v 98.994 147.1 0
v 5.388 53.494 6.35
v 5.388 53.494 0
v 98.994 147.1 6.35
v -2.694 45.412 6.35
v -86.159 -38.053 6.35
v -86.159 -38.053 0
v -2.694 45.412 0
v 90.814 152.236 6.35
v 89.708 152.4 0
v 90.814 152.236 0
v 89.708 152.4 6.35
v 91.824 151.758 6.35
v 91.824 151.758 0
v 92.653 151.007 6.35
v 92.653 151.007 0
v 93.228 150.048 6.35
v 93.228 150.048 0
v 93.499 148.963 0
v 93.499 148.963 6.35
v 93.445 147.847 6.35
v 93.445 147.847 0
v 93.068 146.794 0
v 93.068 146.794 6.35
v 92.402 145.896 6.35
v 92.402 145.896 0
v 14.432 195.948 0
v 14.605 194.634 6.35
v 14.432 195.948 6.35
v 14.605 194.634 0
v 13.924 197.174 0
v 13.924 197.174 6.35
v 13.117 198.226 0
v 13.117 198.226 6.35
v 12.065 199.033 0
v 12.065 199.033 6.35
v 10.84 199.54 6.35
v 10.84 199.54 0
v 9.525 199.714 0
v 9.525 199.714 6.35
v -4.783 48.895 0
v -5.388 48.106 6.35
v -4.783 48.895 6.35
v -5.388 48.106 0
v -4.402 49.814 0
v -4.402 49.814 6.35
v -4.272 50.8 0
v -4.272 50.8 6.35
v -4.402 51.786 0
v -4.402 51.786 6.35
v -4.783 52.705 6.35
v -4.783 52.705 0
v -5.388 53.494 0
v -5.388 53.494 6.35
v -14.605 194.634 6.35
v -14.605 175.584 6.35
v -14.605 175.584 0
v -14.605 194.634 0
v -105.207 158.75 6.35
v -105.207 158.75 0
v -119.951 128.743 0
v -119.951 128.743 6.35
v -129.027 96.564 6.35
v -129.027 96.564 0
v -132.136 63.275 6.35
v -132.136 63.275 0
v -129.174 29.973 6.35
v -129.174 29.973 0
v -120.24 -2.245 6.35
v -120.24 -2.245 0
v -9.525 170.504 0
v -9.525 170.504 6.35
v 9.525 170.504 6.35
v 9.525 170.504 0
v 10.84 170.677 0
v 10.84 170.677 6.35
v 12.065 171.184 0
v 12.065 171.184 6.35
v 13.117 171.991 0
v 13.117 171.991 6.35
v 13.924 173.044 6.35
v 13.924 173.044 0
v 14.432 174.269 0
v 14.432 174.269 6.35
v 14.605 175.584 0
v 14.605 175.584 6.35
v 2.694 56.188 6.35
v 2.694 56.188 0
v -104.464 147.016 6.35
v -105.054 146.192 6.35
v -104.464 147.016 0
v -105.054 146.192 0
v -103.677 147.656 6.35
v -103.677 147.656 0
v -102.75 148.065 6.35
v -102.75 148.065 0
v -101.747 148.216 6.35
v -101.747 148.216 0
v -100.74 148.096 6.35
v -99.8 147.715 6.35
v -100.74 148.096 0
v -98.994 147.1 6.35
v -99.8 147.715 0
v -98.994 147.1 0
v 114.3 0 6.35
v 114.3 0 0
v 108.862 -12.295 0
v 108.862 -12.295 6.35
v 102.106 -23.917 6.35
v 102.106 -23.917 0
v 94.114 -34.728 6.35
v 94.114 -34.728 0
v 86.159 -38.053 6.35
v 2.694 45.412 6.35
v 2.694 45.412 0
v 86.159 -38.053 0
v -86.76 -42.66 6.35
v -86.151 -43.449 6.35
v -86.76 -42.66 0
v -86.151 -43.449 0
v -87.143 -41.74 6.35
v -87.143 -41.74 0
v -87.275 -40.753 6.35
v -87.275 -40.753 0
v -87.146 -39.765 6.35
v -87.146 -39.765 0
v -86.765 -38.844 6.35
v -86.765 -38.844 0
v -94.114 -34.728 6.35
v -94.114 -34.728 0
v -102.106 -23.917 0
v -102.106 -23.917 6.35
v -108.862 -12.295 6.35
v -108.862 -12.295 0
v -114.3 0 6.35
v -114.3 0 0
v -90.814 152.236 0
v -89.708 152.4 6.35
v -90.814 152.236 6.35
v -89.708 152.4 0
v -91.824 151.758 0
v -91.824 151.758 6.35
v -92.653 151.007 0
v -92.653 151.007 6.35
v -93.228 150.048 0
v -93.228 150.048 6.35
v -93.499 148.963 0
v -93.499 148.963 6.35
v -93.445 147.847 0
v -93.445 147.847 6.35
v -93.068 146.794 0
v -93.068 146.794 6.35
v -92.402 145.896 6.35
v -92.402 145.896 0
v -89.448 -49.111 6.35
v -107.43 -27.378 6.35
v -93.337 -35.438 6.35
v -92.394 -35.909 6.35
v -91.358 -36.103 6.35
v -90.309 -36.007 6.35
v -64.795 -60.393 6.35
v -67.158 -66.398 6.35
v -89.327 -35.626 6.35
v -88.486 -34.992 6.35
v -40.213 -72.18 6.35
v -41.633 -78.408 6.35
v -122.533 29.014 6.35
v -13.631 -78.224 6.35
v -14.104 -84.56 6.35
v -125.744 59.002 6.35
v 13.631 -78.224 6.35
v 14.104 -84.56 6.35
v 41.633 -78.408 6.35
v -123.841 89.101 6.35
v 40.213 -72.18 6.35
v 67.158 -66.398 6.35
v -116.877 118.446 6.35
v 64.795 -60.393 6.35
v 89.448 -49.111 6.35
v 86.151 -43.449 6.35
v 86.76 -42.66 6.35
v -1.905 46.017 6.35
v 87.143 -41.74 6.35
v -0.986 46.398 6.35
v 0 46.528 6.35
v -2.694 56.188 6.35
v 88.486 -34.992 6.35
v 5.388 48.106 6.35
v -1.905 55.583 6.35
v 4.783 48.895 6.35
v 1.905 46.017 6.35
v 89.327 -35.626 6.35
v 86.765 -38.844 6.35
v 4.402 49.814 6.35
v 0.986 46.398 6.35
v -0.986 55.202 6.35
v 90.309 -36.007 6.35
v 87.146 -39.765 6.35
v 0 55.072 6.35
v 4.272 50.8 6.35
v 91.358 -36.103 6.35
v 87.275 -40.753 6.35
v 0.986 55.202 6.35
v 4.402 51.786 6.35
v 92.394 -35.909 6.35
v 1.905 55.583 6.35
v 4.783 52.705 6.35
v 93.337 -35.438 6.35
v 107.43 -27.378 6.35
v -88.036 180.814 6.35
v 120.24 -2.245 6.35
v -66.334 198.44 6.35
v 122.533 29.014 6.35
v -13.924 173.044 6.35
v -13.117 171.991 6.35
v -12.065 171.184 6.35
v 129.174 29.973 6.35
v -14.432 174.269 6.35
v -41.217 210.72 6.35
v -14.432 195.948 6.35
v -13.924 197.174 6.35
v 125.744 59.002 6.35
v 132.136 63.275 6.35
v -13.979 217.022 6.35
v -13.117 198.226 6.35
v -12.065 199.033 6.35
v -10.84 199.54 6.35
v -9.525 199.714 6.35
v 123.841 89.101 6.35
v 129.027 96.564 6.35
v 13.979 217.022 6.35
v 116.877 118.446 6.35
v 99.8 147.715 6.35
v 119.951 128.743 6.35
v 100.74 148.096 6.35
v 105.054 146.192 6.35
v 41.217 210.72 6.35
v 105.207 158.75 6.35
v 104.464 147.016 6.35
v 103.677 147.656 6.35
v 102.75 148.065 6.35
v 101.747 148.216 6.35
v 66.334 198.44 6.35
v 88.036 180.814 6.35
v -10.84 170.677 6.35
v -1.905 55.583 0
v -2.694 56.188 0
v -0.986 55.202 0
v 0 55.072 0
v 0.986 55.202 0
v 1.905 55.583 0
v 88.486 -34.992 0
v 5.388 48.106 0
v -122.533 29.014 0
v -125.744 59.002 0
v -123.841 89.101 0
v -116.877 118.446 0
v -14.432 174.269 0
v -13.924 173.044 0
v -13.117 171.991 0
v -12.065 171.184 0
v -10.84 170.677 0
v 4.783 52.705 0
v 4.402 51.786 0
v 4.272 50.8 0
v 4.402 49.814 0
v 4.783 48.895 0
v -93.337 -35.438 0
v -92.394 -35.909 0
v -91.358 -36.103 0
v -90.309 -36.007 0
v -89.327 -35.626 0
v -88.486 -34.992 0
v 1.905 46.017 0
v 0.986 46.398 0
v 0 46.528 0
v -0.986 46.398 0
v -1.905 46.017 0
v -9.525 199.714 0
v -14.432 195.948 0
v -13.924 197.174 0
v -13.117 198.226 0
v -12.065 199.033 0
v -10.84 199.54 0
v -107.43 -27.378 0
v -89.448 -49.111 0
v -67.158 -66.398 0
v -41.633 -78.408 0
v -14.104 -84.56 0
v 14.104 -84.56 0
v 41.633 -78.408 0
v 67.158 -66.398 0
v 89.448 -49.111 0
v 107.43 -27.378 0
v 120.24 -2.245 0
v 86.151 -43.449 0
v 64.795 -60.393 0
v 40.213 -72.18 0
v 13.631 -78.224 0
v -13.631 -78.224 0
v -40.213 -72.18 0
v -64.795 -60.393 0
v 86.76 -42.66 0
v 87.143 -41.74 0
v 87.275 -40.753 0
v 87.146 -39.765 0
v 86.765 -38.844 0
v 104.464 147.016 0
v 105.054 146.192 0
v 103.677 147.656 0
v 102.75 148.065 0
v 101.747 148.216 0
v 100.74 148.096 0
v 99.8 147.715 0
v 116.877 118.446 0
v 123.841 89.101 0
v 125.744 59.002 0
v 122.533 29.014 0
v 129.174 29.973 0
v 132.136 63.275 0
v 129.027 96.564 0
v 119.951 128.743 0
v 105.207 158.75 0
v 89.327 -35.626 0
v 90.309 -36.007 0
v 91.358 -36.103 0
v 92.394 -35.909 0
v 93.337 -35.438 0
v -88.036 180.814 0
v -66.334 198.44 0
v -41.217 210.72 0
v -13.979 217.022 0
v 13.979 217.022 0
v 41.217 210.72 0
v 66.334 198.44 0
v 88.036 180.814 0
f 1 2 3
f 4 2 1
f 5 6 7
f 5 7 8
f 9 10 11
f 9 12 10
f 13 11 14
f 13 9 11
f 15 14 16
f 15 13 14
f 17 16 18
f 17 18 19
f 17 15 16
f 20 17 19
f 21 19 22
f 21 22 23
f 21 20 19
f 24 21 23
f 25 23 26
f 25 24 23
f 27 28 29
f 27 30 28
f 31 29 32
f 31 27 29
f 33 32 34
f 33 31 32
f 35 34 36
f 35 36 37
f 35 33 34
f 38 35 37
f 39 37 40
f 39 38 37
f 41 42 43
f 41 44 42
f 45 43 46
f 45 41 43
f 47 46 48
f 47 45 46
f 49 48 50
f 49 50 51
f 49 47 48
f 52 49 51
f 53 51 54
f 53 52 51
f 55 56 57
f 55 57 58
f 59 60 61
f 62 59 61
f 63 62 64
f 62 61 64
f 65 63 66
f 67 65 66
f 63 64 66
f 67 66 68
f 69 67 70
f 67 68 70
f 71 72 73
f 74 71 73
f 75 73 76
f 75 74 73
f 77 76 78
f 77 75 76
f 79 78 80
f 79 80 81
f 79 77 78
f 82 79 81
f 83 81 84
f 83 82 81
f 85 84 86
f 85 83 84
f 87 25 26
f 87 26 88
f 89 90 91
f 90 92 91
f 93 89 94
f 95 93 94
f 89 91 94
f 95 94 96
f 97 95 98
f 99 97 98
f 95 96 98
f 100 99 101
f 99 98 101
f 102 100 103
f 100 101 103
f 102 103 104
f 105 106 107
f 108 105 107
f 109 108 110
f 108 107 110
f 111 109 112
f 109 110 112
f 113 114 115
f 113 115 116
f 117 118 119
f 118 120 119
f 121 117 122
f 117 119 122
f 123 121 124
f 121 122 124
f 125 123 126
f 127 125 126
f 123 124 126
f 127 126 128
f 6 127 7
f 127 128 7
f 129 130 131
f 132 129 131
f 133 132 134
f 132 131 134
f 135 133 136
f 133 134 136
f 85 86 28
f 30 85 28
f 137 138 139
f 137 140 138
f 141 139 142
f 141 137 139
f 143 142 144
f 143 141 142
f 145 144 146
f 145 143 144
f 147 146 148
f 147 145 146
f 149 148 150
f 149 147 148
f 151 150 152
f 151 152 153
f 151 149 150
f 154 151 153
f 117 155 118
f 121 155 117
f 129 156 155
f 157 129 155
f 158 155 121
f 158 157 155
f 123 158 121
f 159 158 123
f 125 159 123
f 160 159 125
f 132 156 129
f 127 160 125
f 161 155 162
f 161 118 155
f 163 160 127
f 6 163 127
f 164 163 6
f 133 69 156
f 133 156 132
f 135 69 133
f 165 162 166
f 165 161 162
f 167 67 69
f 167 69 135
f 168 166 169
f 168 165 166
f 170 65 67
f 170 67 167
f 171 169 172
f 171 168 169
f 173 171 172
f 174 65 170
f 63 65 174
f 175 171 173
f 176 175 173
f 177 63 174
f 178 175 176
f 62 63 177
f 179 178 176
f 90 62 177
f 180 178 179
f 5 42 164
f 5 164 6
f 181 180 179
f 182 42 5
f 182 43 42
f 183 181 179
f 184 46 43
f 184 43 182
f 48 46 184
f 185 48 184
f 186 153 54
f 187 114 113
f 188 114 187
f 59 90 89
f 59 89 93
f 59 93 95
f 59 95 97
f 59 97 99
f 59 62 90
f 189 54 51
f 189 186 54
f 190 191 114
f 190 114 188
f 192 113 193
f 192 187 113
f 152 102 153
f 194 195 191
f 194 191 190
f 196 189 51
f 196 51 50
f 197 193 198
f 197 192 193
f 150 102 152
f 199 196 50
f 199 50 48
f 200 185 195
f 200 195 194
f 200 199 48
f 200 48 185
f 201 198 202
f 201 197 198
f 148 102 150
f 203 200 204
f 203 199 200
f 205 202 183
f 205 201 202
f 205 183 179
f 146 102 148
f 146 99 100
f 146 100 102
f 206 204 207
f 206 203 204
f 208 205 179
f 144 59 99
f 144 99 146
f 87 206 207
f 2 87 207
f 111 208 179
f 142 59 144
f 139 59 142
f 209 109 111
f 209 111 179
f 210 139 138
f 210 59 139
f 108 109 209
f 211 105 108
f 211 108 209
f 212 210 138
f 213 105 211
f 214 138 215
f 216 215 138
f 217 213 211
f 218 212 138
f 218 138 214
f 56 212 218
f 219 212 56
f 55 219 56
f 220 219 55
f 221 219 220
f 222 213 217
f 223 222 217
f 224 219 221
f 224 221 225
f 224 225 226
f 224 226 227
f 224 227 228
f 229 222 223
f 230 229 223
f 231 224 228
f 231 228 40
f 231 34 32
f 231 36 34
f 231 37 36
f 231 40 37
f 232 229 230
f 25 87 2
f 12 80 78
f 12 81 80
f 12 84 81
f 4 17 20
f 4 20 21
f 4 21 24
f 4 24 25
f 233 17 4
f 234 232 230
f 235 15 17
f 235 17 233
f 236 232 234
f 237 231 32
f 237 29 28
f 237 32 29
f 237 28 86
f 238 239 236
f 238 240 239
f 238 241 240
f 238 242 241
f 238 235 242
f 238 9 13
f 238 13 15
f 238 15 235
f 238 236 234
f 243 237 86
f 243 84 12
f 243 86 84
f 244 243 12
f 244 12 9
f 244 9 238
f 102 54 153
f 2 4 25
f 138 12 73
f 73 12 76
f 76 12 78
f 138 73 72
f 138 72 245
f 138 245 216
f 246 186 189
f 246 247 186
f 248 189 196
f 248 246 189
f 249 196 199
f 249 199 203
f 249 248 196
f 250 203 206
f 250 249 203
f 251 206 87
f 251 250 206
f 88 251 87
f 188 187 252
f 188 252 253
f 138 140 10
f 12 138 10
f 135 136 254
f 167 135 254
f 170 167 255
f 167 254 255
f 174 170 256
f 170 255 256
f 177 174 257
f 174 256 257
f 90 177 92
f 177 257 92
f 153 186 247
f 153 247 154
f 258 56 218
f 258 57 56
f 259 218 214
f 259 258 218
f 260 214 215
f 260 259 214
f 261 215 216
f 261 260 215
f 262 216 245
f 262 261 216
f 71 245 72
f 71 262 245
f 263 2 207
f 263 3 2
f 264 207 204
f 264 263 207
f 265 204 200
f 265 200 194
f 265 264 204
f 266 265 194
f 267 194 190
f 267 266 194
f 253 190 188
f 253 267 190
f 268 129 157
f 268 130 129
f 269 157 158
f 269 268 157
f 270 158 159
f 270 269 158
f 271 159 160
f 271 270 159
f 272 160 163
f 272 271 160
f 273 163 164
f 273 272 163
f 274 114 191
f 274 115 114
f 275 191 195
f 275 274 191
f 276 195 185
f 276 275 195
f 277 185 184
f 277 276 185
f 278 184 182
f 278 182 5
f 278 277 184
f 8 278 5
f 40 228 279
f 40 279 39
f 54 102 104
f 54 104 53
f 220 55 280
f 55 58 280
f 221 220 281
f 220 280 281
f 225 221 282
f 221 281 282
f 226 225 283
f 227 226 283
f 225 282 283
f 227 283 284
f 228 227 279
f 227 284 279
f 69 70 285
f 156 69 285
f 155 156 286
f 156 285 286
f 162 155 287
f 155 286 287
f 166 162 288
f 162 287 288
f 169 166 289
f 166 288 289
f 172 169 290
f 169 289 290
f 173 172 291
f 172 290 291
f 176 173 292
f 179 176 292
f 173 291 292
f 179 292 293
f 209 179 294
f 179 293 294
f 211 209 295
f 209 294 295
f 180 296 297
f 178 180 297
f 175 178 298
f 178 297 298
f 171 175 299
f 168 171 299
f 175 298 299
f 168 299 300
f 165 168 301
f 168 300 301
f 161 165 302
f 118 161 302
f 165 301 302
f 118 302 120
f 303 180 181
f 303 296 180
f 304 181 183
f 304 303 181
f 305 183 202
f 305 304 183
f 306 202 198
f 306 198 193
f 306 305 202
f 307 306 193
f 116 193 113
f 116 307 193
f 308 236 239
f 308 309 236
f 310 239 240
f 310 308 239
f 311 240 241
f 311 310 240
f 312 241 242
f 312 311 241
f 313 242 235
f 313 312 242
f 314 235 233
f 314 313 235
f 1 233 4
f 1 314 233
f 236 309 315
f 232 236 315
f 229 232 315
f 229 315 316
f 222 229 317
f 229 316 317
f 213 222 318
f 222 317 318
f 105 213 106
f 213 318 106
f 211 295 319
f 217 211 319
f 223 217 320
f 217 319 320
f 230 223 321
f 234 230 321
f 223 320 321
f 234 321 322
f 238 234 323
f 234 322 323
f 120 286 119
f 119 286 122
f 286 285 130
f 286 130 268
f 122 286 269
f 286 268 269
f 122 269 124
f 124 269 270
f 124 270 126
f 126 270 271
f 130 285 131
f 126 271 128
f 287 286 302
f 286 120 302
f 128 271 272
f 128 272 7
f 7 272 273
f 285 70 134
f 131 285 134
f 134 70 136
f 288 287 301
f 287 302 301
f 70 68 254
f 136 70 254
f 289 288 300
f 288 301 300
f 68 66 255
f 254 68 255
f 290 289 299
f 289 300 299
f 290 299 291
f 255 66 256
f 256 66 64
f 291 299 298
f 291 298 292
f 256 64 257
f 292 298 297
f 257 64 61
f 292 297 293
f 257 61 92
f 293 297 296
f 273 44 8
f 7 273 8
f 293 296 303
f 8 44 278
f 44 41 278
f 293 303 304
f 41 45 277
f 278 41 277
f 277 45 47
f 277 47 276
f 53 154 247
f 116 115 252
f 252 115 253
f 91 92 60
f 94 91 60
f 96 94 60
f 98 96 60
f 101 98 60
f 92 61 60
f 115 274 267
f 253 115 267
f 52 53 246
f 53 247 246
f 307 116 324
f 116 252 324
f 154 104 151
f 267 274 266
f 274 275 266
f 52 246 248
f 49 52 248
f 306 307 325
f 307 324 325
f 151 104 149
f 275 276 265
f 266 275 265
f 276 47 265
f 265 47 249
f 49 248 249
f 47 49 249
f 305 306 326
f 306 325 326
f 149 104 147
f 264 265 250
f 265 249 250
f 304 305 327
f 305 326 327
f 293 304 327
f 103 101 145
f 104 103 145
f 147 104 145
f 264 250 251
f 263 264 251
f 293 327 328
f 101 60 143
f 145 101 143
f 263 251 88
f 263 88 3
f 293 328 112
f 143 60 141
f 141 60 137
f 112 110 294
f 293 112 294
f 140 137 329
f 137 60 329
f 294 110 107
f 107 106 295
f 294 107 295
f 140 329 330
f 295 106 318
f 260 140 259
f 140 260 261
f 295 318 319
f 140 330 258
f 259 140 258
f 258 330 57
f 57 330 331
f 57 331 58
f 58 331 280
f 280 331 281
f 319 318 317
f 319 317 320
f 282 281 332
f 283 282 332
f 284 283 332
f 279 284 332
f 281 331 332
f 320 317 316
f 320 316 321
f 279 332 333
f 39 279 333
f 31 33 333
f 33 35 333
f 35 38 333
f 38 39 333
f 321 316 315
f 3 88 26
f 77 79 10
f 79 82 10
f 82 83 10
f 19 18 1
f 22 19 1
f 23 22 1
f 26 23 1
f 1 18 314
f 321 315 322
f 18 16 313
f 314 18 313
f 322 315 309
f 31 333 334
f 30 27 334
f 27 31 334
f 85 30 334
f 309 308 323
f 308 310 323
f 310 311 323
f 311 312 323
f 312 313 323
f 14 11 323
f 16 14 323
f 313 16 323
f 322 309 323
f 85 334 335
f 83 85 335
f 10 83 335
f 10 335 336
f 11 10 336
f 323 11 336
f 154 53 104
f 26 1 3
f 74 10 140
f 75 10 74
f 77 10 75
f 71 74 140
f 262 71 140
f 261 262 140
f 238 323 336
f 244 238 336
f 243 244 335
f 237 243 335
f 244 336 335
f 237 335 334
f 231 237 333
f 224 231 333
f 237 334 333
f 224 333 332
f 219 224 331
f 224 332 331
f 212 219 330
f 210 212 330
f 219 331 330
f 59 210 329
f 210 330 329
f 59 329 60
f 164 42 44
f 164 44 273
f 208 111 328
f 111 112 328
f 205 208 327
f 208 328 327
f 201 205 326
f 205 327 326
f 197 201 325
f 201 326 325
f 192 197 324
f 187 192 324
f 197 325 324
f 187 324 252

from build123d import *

# Parameters (mm, degrees)
BOSS_EXTRUDE1_DEPTH = 6.35
CUT_EXTRUDE1_REACH  = 8.35
SKETCH2_W           = 29.21
SKETCH2_H           = 29.21
FILLET1_R           = 5.08
BOSS_EXTRUDE2_DEPTH = 6.35
FILLET2_R           = 3.81


with BuildPart() as part:
    # Sketch1 → Boss-Extrude1 (new body)
    with BuildSketch(Plane.XY):
        with BuildLine():
            ThreePointArc((-105.206508748, 158.75), (-131.338700922, 79.990592372), (-120.239774453, -2.245346177))
            ThreePointArc((-120.239774453, -2.245346177), (0, -85.336489431), (120.239774453, -2.245346177))
            ThreePointArc((120.239774453, -2.245346177), (131.338700922, 79.990592372), (105.206508748, 158.75))
            ThreePointArc((105.206508748, 158.75), (0, 217.817133941), (-105.206508748, 158.75))
        make_face()
        with BuildLine():
            Line((-101.6, 152.4), (101.6, 152.4))
            ThreePointArc((101.6, 152.4), (125.172151144, 77.635179262), (114.3, 0))
            ThreePointArc((114.3, 0), (0, -78.986489431), (-114.3, 0))
            ThreePointArc((-114.3, 0), (-125.172151144, 77.635179262), (-101.6, 152.4))
        make_face(mode=Mode.SUBTRACT)
    extrude(amount=BOSS_EXTRUDE1_DEPTH)

    # Sketch2 → Cut-Extrude1 (cut, up to next)
    with BuildSketch(Plane.XY.offset(6.35), mode=Mode.PRIVATE) as cut_extrude1_sk1:
        with Locations((0, 185.10856697)):
            Rectangle(SKETCH2_W, SKETCH2_H)
    cut_extrude1_tool1 = extrude(cut_extrude1_sk1.sketch, amount=-CUT_EXTRUDE1_REACH, mode=Mode.PRIVATE) & part.part
    add(cut_extrude1_tool1.solids().sort_by_distance((0, 185.108567, 6.35))[0], mode=Mode.SUBTRACT)

    # Fillet1
    fillet1_edges = [part.edges().sort_by_distance(p)[0] for p in [
        (14.605, 199.71356697, 3.175),
        (14.605, 170.50356697, 3.175),
        (-14.605, 170.50356697, 3.175),
        (-14.605, 199.71356697, 3.175),
    ]]
    fillet(fillet1_edges, radius=FILLET1_R)

    # Sketch3 → Boss-Extrude2 (add)
    with BuildSketch(Plane.XY.offset(6.35)):
        Polygon((-100.252961582, 153.747038418), (-102.947038418, 151.052961582), (-2.694076836, 50.8), (-93.720570633, -40.226493797), (-91.026493797, -42.920570633), (0, 48.105923164), (91.026493797, -42.920570633), (93.720570633, -40.226493797), (2.694076836, 50.8), (102.947038418, 151.052961582), (100.252961582, 153.747038418), (0, 53.494076836), align=None)
    extrude(amount=-BOSS_EXTRUDE2_DEPTH)

    # Fillet2
    fillet2_edges = [part.edges().sort_by_distance(p)[0] for p in [
        (102.584006308, 150.689929472, 3.175),
        (98.905923164, 152.4, 3.175),
        (-88.818700326, -40.712777162, 3.175),
        (-91.394282222, -37.900205386, 3.175),
        (0, 53.494076836, 3.175),
        (-102.584006308, 150.689929472, 3.175),
        (-98.905923164, 152.4, 3.175),
        (0, 48.105923164, 3.175),
        (88.818700326, -40.712777162, 3.175),
        (91.394282222, -37.900205386, 3.175),
        (2.694076836, 50.8, 3.175),
        (-2.694076836, 50.8, 3.175),
    ]]
    fillet(fillet2_edges, radius=FILLET2_R)


solid = part.part
